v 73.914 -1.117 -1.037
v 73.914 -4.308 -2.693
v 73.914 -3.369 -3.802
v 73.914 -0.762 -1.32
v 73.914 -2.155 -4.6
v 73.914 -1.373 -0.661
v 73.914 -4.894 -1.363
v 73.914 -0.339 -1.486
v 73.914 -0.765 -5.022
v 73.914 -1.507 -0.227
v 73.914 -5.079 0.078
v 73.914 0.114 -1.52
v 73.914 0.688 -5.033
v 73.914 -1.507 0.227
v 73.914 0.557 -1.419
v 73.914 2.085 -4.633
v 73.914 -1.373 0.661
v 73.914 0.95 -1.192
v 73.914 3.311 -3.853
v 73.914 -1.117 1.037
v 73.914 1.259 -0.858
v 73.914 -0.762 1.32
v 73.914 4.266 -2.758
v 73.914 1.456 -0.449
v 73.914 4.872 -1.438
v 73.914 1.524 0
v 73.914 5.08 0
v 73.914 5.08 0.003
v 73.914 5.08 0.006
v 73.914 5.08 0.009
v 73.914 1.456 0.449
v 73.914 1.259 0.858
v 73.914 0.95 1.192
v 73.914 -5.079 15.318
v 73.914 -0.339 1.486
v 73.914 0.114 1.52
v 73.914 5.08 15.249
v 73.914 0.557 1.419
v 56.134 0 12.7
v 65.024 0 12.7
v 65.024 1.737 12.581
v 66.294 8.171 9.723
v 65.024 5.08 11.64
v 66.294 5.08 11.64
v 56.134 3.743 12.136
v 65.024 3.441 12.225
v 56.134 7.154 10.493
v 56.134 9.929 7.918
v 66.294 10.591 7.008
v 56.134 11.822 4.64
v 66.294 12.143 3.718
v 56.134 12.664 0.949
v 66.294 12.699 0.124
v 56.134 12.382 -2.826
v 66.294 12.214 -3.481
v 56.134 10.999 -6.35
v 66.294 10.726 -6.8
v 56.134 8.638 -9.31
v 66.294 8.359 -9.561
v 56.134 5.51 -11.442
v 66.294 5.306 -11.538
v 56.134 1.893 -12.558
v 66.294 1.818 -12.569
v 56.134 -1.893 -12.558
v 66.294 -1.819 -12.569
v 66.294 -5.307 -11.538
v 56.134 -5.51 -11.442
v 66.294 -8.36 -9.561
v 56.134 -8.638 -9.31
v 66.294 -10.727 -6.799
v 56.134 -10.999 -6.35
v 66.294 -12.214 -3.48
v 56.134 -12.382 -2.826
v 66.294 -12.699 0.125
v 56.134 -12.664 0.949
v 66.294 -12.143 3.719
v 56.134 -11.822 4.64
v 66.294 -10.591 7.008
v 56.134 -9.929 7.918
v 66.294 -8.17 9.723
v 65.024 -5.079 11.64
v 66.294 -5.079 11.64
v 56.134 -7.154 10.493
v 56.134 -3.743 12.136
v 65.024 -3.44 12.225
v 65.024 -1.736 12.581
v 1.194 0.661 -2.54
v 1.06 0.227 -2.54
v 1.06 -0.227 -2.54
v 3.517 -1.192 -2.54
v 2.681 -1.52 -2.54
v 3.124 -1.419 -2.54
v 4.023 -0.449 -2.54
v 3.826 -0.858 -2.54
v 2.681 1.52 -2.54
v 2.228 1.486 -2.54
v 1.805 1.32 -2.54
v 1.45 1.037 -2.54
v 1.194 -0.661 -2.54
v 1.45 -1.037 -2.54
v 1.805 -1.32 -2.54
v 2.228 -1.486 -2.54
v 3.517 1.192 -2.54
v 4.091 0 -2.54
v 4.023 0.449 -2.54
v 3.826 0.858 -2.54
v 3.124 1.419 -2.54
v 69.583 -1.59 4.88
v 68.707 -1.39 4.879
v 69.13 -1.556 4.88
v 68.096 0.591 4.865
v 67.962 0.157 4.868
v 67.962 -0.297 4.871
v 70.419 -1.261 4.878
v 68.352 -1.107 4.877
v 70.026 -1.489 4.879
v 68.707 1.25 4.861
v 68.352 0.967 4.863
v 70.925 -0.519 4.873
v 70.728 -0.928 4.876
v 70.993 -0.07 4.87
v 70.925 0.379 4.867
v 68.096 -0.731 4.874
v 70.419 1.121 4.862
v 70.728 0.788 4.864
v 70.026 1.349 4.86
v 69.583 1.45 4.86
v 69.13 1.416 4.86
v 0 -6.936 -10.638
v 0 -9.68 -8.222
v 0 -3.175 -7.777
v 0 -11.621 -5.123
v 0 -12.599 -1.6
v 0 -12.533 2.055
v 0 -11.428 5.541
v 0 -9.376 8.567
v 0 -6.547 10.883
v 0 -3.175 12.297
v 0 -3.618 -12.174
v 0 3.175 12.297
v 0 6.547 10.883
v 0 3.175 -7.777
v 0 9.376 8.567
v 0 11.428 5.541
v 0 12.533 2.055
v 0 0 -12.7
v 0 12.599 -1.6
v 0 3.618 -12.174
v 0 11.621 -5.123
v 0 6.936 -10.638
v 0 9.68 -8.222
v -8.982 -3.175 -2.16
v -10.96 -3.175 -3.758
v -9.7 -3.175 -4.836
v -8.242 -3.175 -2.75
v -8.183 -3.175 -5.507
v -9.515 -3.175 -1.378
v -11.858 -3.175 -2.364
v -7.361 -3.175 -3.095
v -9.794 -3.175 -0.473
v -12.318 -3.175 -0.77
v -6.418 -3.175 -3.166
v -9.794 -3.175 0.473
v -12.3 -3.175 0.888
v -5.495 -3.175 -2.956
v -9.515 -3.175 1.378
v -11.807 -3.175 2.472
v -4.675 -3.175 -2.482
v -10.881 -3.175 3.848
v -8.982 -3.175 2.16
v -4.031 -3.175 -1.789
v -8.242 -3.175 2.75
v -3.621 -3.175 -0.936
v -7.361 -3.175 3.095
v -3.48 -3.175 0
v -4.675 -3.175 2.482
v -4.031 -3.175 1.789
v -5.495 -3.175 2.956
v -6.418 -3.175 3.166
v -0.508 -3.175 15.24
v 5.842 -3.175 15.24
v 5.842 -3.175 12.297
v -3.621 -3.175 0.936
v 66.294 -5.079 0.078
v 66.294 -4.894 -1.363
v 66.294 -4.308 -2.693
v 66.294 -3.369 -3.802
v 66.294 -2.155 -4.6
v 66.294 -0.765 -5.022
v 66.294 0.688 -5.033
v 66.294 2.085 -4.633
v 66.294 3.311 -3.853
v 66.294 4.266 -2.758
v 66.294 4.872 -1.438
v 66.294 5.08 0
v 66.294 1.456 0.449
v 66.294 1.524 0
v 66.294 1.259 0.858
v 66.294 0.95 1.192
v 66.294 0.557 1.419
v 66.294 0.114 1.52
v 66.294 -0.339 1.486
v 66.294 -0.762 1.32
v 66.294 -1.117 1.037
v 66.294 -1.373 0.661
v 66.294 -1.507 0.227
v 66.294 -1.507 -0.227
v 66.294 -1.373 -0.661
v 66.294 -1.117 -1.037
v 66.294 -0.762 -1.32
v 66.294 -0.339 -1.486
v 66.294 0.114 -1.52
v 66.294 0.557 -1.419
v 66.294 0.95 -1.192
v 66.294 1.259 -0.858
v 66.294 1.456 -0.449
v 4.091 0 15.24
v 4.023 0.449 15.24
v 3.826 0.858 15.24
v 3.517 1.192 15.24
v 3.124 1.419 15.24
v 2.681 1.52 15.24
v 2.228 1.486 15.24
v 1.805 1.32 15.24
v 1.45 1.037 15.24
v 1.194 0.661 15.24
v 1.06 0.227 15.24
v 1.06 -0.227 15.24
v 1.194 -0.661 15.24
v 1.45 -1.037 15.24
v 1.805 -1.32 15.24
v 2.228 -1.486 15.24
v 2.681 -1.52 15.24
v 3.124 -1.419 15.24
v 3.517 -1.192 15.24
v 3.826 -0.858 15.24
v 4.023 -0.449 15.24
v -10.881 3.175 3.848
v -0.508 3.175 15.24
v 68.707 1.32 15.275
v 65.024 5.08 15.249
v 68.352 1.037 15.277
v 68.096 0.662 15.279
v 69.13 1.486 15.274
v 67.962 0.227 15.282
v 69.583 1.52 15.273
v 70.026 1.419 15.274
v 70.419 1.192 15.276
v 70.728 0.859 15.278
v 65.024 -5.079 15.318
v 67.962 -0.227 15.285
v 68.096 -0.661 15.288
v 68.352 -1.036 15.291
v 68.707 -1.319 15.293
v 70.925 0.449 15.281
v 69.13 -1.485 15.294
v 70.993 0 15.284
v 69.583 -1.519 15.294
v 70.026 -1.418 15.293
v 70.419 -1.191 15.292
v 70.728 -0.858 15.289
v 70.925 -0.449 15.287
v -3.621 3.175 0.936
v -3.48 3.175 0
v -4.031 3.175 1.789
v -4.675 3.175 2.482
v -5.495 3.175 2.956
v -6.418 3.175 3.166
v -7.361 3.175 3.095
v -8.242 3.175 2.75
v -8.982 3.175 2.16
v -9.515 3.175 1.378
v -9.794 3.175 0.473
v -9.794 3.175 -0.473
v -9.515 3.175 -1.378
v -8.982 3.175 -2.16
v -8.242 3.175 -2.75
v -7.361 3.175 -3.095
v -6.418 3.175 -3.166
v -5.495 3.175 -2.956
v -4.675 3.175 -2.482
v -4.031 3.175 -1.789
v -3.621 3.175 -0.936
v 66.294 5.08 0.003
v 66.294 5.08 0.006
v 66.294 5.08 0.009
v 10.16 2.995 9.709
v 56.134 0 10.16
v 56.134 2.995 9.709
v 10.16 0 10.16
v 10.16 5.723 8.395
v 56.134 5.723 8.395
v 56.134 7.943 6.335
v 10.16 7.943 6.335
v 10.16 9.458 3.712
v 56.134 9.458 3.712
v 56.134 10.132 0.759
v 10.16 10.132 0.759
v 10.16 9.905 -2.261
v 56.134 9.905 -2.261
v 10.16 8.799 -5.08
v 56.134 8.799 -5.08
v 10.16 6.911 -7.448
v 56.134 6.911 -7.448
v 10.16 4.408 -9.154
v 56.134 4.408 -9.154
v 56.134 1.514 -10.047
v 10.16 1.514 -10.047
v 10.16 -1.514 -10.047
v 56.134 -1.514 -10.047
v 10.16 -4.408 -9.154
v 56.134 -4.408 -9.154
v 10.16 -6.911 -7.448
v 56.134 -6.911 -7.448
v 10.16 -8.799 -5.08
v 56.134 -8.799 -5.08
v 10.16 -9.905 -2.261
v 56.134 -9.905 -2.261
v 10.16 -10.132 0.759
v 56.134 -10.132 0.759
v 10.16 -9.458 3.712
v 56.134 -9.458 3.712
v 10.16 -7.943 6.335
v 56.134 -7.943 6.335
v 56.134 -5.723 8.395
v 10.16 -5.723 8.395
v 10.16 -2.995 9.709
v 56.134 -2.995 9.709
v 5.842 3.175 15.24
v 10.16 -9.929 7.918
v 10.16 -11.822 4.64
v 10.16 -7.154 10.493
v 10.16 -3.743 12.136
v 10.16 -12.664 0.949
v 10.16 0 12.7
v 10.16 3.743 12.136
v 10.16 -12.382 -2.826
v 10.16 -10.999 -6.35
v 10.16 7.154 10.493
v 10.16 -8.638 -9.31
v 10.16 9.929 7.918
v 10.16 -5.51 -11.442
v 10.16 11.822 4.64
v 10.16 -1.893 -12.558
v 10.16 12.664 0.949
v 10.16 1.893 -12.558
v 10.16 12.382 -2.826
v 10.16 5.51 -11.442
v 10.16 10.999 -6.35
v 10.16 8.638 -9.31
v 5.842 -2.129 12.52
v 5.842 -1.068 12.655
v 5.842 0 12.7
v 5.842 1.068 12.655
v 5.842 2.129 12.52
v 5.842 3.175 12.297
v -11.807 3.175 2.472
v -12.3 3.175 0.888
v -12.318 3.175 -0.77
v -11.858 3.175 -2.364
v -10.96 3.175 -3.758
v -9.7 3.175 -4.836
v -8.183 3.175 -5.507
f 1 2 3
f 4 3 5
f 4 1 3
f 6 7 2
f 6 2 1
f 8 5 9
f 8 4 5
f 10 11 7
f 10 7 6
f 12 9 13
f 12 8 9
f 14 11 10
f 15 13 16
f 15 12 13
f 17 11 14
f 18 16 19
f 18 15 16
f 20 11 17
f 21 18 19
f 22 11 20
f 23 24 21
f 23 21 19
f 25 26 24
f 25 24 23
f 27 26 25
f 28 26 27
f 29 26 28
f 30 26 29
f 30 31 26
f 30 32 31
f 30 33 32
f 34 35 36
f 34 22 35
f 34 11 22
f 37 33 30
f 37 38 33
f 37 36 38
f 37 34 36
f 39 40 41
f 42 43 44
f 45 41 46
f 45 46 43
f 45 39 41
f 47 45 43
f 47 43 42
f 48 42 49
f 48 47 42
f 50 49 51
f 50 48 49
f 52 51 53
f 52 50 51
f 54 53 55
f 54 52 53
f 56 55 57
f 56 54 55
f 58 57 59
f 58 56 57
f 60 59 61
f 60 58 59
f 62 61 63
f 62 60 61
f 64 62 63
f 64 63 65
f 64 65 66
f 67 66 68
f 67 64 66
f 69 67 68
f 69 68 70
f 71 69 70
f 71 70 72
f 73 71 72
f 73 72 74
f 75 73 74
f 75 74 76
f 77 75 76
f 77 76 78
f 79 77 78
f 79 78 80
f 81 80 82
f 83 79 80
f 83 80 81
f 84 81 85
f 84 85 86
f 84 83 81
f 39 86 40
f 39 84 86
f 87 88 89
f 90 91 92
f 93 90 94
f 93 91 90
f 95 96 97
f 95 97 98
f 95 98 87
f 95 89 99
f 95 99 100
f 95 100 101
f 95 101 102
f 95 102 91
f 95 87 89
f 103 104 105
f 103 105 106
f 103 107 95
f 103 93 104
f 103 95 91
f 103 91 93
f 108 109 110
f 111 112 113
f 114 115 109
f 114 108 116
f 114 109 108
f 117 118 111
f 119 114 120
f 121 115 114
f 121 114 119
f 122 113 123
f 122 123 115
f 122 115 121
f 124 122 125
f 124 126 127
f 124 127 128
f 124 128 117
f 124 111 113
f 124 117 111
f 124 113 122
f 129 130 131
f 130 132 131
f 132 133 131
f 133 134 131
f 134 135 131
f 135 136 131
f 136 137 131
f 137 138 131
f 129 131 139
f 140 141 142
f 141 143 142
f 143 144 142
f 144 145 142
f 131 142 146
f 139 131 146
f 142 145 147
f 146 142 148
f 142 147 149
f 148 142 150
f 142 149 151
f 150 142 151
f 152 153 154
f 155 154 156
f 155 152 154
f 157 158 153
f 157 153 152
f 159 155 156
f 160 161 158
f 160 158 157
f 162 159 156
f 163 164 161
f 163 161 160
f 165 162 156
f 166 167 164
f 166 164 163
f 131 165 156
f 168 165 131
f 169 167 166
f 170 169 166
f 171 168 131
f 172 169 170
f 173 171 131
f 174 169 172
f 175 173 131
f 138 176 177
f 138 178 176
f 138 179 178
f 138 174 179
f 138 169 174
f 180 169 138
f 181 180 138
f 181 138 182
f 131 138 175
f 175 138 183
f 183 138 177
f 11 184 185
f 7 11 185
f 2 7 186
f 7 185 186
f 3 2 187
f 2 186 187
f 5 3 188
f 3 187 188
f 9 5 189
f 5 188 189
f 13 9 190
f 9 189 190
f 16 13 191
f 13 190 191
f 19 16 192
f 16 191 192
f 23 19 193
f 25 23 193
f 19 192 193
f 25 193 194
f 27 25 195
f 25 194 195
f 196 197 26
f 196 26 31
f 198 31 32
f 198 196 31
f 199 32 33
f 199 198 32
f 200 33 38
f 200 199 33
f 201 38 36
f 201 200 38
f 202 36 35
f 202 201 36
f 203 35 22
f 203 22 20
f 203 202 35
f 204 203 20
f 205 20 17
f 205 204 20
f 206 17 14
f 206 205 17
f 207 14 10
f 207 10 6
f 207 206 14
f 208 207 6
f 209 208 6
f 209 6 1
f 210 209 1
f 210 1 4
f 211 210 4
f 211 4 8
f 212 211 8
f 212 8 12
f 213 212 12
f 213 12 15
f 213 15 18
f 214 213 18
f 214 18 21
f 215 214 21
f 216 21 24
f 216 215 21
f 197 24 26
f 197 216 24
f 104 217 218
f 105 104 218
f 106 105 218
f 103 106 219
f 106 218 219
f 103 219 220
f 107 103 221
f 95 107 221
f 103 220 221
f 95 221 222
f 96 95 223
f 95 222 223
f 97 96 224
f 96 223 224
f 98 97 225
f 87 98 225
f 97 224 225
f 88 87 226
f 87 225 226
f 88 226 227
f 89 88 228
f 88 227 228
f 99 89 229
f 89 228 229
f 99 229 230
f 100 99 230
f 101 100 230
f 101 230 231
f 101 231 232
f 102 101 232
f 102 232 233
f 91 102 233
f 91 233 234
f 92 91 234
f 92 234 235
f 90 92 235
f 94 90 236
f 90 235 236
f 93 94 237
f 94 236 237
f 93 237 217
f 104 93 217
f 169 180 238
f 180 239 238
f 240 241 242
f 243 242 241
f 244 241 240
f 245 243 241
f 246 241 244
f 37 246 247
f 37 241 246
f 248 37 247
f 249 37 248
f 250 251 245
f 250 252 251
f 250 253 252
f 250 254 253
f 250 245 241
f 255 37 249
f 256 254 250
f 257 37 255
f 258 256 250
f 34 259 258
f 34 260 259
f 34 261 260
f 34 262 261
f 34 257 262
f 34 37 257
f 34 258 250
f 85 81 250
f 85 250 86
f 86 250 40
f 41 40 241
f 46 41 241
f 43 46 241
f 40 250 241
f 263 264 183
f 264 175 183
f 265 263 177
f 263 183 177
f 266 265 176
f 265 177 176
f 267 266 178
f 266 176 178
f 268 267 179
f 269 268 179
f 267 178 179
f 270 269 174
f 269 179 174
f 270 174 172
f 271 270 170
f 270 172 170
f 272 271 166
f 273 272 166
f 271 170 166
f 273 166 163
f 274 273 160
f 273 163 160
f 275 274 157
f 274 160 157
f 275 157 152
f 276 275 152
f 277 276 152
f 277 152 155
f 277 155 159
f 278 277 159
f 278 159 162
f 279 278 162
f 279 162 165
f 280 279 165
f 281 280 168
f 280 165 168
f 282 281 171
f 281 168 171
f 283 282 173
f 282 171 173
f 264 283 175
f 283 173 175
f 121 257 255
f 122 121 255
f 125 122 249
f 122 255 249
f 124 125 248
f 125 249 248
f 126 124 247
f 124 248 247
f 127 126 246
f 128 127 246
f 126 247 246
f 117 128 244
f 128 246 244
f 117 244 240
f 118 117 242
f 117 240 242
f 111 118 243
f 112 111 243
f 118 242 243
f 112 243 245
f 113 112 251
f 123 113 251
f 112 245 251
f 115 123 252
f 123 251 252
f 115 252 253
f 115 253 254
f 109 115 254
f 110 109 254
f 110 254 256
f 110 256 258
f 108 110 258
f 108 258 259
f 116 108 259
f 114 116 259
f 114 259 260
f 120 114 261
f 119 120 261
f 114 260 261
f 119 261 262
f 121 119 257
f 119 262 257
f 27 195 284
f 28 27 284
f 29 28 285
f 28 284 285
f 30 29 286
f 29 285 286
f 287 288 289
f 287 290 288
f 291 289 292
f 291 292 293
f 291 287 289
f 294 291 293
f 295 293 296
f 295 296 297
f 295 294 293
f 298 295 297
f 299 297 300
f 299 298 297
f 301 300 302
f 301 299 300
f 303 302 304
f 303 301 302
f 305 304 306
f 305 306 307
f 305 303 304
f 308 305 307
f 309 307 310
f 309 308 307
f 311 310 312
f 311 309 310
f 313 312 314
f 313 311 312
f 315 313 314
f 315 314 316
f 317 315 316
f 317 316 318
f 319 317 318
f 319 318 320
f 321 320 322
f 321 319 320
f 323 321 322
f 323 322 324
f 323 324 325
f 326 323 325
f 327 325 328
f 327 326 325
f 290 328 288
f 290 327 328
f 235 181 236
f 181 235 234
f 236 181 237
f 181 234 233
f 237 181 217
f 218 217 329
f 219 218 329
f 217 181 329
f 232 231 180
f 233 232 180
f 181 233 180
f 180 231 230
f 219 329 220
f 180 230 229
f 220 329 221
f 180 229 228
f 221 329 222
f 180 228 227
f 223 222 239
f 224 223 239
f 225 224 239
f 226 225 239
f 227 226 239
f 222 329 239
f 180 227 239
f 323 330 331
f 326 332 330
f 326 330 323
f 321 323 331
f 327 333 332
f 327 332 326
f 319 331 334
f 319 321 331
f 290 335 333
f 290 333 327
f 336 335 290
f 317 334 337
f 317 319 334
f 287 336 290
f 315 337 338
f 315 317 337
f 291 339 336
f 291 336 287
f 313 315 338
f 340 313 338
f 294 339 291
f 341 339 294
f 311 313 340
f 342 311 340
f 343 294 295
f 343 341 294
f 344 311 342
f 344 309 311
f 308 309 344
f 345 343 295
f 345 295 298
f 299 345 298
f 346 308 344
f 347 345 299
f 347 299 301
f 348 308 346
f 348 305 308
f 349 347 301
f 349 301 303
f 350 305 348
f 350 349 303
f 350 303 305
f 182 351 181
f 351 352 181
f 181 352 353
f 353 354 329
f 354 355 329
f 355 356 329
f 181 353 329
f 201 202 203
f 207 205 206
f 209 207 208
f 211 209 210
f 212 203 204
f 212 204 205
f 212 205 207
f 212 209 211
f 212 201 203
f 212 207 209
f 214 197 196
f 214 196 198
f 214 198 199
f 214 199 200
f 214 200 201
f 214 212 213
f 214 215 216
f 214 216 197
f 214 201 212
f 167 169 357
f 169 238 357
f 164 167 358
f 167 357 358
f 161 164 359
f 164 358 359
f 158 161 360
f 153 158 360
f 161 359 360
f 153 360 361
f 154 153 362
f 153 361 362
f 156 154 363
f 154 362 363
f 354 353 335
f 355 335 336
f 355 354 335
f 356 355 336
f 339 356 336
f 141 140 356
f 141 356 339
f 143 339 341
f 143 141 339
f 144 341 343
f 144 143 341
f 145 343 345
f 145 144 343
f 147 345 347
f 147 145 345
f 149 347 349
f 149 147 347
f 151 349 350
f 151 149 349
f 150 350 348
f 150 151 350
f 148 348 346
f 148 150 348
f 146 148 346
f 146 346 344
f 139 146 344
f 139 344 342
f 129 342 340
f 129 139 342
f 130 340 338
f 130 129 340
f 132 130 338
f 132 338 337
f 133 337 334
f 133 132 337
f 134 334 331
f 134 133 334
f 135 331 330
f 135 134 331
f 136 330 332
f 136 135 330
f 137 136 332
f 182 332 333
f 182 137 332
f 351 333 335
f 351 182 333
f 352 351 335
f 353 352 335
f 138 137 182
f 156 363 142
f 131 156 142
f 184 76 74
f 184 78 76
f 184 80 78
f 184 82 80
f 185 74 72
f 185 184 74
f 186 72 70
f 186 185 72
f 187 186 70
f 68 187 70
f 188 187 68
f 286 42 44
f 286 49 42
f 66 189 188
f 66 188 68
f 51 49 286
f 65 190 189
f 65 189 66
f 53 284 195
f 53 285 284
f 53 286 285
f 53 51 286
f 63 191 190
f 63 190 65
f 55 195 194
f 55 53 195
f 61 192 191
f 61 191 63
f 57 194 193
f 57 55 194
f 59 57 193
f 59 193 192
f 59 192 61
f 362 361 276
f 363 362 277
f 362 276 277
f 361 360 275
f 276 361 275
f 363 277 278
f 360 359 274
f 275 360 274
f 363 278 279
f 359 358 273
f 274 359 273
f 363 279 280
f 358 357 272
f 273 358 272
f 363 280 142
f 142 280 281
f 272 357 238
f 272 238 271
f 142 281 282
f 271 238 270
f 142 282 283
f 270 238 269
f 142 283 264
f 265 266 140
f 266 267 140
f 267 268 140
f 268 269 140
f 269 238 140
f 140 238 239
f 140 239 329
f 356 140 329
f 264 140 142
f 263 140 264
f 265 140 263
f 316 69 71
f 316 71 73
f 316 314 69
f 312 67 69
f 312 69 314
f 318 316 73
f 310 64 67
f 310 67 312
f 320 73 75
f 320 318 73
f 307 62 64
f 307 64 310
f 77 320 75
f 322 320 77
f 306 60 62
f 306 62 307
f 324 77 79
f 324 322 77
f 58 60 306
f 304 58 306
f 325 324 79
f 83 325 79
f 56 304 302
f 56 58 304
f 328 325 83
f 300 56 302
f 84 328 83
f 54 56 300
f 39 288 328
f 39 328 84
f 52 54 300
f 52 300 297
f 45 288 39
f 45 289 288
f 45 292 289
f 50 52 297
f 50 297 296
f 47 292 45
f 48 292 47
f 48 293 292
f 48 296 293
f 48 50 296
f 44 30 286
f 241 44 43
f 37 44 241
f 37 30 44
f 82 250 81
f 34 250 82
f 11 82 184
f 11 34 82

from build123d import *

# Parameters (mm, degrees)
F0_W      = 5.842
F0_H      = 12.7
F0_R      = 3.175
F2_DEPTH  = 3.175
F3_DEPTH  = 6.35
F4_R      = 1.524
F5_DEPTH  = 7.62
F6_DEPTH  = 1.27
F8_R      = 1.524
F9_DEPTH  = 10.414
F7_R      = 1.524
F10_DEPTH = 17.78


with BuildPart() as f1:
    # F0 (on Front) → F1 (revolve)
    with BuildSketch(Plane.XZ):
        Polygon((5.842, 12.7), (5.842, 0), (66.294, 0), (66.294, 12.7), (56.134, 12.7), (56.134, 10.16), (10.16, 10.16), (10.16, 12.7), align=None)
        with Locations((2.921, 6.35)):
            Rectangle(F0_W, F0_H)
    revolve(axis=Axis((33.147, 0, 0), (-1, 0, 0)))

    # F0 (on Front) → F2 (join)
    with BuildSketch(Plane.XZ):
        with BuildLine():
            Line((-0.9398, 0), (0, 0))
            Line((0, 0), (0, 12.7))
            Line((0, 12.7), (5.842, 12.7))
            Line((5.842, 12.7), (5.842, 15.24))
            Line((5.842, 15.24), (-0.508, 15.24))
            Line((-0.508, 15.24), (-10.8806298187, 3.8475430269))
            ThreePointArc((-10.8806298187, 3.8475430269), (-4.5919612295, 5.3297205562), (-0.9398, 0))
        make_face()
        with BuildLine():
            ThreePointArc((-8.1826630726, -5.5069827884), (-3.1957909266, -4.5493385486), (-0.9398, 0))
            ThreePointArc((-0.9398, 0), (-4.5919612295, 5.3297205562), (-10.8806298187, 3.8475430269))
            ThreePointArc((-10.8806298187, 3.8475430269), (-12.1459778134, -1.5837270034), (-8.1826630726, -5.5069827884))
        make_face()
        with Locations((-6.6548, 0)):
            Circle(F0_R, mode=Mode.SUBTRACT)
        with BuildLine():
            Line((5.842, 0), (0, 0))
            Line((0, 0), (-0.9398, 0))
            ThreePointArc((-0.9398, 0), (-3.1957909266, -4.5493385486), (-8.1826630726, -5.5069827884))
            Line((-8.1826630726, -5.5069827884), (5.842, -9.398))
            Line((5.842, -9.398), (5.842, 0))
        make_face()
        with Locations((2.921, 6.35)):
            Rectangle(F0_W, F0_H)
    extrude(amount=F2_DEPTH)

    # F3 (add): a face of the model
    f3_faces = [f1.faces().sort_by_distance(p)[0] for p in [
        (-3.7379712186, -3.175, 3.6396098822),
    ]]
    extrude(f3_faces, amount=-F3_DEPTH)

    # F4 (on face) → F5 (join)
    with BuildSketch(Plane.YZ.offset(66.294)):
        with BuildLine():
            ThreePointArc((-5.0794025007, 0.0779117191), (-0.0389570051, -5.079850623), (5.08, 0))
            ThreePointArc((5.08, 0), (5.0799978531, 0.0046703639), (5.0799914125, 0.0093407238))
            ThreePointArc((5.0799914125, 0.0093407238), (0.0342867621, 5.0798842918), (-5.0794025007, 0.0779117191))
        make_face()
        Circle(F4_R, mode=Mode.SUBTRACT)
        with BuildLine():
            ThreePointArc((-5.0794025007, 0.0779117191), (0.0342867621, 5.0798842918), (5.0799914125, 0.0093407238))
            Line((5.0799914125, 0.0093407238), (5.0799914125, 11.6397460131))
            ThreePointArc((5.0799914125, 11.6397460131), (0.0003212741, 12.6999999959), (-5.0794025007, 11.640003017))
            Line((-5.0794025007, 11.640003017), (-5.0794025007, 0.0779117191))
        make_face()
        with BuildLine():
            ThreePointArc((-5.0794025007, 11.640003017), (0.0003212741, 12.6999999959), (5.0799914125, 11.6397460131))
            Line((5.0799914125, 11.6397460131), (5.0799914125, 15.2493407238))
            Line((5.0799914125, 15.2493407238), (-5.0794025007, 15.3179117191))
            Line((-5.0794025007, 15.3179117191), (-5.0794025007, 11.640003017))
        make_face()
    extrude(amount=F5_DEPTH)

    # F6 (add): a face of the model
    f6_faces = [f1.faces().sort_by_distance(p)[0] for p in [
        (66.294, -0.0194413751, 13.8014276959),
    ]]
    extrude(f6_faces, amount=F6_DEPTH)

    # F8 (on face) → F9 (cut)
    with BuildSketch(Plane(origin=(0, 0.1031523992, 15.2829319801), x_dir=(1, 0, 0), z_dir=(0, 0.0067493626, 0.9999772228))):
        with Locations((69.469, -0.1028602862)):
            Circle(F8_R)
    extrude(amount=-F9_DEPTH, mode=Mode.SUBTRACT)

    # F7 (on face) → F10 (cut)
    with BuildSketch(Plane.XY.offset(15.24)):
        with Locations((2.5670649484, 0)):
            Circle(F7_R)
    extrude(amount=-F10_DEPTH, mode=Mode.SUBTRACT)


solid = f1.part
